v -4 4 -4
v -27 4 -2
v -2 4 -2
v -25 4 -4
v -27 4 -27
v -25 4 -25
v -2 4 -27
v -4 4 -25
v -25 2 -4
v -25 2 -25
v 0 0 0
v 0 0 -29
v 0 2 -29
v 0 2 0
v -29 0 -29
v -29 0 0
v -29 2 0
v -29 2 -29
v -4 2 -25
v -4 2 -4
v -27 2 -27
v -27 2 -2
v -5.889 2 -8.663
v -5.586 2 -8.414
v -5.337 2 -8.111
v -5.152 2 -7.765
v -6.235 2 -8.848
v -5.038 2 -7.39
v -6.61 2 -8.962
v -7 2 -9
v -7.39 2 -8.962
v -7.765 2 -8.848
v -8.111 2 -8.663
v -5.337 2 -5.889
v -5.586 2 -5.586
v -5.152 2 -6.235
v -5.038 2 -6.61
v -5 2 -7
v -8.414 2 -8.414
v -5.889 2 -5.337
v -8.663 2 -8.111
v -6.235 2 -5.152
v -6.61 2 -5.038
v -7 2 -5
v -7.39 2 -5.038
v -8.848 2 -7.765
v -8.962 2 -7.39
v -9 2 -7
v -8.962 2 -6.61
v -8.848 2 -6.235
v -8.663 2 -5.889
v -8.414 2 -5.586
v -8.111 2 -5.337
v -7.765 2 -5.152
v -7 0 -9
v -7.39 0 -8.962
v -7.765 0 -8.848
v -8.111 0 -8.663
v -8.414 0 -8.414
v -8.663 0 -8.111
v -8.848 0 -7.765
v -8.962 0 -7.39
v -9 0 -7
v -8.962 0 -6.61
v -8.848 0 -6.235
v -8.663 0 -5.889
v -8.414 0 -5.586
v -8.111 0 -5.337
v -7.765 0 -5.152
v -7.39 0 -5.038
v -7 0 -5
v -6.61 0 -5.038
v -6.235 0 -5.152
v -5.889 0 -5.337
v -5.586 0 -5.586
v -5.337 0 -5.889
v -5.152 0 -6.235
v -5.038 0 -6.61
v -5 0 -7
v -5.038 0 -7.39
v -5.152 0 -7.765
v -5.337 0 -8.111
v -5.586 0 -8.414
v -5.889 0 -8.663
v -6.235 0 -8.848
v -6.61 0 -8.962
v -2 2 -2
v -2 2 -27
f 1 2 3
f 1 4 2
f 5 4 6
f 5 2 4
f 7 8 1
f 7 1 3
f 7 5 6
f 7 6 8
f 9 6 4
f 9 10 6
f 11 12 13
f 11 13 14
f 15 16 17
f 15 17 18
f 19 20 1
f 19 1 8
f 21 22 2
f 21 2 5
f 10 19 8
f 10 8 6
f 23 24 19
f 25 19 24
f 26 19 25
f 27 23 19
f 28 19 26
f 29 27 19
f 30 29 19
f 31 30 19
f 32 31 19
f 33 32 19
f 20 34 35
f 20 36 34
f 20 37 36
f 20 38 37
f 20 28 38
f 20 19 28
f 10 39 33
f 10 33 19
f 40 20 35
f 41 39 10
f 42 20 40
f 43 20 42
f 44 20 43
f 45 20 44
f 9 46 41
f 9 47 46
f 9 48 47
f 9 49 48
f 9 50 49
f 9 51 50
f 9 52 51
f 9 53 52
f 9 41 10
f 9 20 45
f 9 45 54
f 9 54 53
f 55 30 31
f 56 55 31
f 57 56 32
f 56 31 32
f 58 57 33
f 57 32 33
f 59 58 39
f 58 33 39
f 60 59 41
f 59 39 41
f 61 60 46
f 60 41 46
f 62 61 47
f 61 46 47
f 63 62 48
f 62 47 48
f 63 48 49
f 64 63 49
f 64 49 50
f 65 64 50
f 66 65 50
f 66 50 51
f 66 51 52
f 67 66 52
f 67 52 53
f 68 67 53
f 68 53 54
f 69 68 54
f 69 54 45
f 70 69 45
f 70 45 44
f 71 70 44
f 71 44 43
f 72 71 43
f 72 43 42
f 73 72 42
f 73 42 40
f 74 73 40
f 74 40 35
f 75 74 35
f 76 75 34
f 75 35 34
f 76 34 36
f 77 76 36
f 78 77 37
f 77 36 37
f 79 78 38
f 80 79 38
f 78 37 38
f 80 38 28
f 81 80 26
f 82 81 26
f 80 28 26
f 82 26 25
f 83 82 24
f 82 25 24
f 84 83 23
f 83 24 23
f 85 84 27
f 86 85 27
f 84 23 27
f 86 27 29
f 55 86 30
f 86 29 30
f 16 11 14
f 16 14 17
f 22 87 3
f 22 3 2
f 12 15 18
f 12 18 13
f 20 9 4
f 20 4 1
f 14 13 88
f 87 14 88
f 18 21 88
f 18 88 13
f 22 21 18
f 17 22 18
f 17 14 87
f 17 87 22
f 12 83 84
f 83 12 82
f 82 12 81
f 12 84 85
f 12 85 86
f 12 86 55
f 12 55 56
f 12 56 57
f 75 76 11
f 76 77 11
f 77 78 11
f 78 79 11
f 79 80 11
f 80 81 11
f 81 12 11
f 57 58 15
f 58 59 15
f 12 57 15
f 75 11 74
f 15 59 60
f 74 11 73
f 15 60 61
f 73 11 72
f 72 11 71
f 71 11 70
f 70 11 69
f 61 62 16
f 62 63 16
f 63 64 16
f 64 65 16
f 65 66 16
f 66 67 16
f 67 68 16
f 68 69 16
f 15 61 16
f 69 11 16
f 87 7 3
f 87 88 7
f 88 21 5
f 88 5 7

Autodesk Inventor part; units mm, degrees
ref_plane "YZ Plane" through (0, 0, 0) normal (1, 0, 0) x (0, 1, 0)
ref_plane "XZ Plane" through (0, 0, 0) normal (0, 1, 0) x (-1, 0, 0)
ref_plane "XY Plane" through (0, 0, 0) normal (0, 0, 1) x (1, 0, 0)
sketch "Sketch3" plane through (0, 0, 0) normal (0, 1, 0) x (-1, 0, 0)
  line L0 (0, 0) -> (29, 0)
  line L1 (29, 0) -> (29, -29)
  line L2 (29, -29) -> (0, -29)
  line L3 (0, -29) -> (0, 0)
  dimension "d8" = 29
  dimension "d9" = 29
extrude "Extrusion3" add sketch "Sketch3" along normal blind 2
sketch "Sketch4" plane through (0, 2, 0) normal (0, 1, 0) x (1, 0, 0)
  line L0 (-29, 29) -> (-29, 0) projected
  line L1 (-29, 0) -> (0, 0) projected
  line L2 (0, 0) -> (0, 29) projected
  line L3 (0, 29) -> (-29, 29) projected
  line L4 (-27, 2) -> (-27, 27)
  line L5 (-27, 27) -> (-2, 27)
  line L6 (-2, 27) -> (-2, 2)
  line L7 (-2, 2) -> (-27, 2)
  line L8 (-25, 25) -> (-25, 4)
  line L9 (-25, 4) -> (-4, 4)
  line L10 (-4, 4) -> (-4, 25)
  line L11 (-4, 25) -> (-25, 25)
  dimension "d12" = 2
  dimension "d13" = 2
extrude "Extrusion4" add sketch "Sketch4" along normal blind 2 contours L4 L5 L6 L7
sketch "Sketch5" plane through (0, 0, 0) normal (0, -1, 0) x (1, 0, 0)
  line L0 (-4, -4) -> (-4, -25) projected
  line L1 (-4, -25) -> (-25, -25) projected
  line L2 (-25, -25) -> (-25, -4) projected
  line L3 (-25, -4) -> (-4, -4) projected
  line L4 (-4, -4) -> (-7, -4)
  line L5 (-7, -4) -> (-7, -7)
  line L6 (-7, -7) -> (-4, -7)
  line L7 (-4, -7) -> (-4, -4)
  point P0 (0, 0)
  dimension "d16" = 3
  dimension "d17" = 3
hole "Hole1" at (-7, 0, -7) direction (0, 1, 0) diameter 4 end through all
properties part number "waterBallonHolderCapv2"
